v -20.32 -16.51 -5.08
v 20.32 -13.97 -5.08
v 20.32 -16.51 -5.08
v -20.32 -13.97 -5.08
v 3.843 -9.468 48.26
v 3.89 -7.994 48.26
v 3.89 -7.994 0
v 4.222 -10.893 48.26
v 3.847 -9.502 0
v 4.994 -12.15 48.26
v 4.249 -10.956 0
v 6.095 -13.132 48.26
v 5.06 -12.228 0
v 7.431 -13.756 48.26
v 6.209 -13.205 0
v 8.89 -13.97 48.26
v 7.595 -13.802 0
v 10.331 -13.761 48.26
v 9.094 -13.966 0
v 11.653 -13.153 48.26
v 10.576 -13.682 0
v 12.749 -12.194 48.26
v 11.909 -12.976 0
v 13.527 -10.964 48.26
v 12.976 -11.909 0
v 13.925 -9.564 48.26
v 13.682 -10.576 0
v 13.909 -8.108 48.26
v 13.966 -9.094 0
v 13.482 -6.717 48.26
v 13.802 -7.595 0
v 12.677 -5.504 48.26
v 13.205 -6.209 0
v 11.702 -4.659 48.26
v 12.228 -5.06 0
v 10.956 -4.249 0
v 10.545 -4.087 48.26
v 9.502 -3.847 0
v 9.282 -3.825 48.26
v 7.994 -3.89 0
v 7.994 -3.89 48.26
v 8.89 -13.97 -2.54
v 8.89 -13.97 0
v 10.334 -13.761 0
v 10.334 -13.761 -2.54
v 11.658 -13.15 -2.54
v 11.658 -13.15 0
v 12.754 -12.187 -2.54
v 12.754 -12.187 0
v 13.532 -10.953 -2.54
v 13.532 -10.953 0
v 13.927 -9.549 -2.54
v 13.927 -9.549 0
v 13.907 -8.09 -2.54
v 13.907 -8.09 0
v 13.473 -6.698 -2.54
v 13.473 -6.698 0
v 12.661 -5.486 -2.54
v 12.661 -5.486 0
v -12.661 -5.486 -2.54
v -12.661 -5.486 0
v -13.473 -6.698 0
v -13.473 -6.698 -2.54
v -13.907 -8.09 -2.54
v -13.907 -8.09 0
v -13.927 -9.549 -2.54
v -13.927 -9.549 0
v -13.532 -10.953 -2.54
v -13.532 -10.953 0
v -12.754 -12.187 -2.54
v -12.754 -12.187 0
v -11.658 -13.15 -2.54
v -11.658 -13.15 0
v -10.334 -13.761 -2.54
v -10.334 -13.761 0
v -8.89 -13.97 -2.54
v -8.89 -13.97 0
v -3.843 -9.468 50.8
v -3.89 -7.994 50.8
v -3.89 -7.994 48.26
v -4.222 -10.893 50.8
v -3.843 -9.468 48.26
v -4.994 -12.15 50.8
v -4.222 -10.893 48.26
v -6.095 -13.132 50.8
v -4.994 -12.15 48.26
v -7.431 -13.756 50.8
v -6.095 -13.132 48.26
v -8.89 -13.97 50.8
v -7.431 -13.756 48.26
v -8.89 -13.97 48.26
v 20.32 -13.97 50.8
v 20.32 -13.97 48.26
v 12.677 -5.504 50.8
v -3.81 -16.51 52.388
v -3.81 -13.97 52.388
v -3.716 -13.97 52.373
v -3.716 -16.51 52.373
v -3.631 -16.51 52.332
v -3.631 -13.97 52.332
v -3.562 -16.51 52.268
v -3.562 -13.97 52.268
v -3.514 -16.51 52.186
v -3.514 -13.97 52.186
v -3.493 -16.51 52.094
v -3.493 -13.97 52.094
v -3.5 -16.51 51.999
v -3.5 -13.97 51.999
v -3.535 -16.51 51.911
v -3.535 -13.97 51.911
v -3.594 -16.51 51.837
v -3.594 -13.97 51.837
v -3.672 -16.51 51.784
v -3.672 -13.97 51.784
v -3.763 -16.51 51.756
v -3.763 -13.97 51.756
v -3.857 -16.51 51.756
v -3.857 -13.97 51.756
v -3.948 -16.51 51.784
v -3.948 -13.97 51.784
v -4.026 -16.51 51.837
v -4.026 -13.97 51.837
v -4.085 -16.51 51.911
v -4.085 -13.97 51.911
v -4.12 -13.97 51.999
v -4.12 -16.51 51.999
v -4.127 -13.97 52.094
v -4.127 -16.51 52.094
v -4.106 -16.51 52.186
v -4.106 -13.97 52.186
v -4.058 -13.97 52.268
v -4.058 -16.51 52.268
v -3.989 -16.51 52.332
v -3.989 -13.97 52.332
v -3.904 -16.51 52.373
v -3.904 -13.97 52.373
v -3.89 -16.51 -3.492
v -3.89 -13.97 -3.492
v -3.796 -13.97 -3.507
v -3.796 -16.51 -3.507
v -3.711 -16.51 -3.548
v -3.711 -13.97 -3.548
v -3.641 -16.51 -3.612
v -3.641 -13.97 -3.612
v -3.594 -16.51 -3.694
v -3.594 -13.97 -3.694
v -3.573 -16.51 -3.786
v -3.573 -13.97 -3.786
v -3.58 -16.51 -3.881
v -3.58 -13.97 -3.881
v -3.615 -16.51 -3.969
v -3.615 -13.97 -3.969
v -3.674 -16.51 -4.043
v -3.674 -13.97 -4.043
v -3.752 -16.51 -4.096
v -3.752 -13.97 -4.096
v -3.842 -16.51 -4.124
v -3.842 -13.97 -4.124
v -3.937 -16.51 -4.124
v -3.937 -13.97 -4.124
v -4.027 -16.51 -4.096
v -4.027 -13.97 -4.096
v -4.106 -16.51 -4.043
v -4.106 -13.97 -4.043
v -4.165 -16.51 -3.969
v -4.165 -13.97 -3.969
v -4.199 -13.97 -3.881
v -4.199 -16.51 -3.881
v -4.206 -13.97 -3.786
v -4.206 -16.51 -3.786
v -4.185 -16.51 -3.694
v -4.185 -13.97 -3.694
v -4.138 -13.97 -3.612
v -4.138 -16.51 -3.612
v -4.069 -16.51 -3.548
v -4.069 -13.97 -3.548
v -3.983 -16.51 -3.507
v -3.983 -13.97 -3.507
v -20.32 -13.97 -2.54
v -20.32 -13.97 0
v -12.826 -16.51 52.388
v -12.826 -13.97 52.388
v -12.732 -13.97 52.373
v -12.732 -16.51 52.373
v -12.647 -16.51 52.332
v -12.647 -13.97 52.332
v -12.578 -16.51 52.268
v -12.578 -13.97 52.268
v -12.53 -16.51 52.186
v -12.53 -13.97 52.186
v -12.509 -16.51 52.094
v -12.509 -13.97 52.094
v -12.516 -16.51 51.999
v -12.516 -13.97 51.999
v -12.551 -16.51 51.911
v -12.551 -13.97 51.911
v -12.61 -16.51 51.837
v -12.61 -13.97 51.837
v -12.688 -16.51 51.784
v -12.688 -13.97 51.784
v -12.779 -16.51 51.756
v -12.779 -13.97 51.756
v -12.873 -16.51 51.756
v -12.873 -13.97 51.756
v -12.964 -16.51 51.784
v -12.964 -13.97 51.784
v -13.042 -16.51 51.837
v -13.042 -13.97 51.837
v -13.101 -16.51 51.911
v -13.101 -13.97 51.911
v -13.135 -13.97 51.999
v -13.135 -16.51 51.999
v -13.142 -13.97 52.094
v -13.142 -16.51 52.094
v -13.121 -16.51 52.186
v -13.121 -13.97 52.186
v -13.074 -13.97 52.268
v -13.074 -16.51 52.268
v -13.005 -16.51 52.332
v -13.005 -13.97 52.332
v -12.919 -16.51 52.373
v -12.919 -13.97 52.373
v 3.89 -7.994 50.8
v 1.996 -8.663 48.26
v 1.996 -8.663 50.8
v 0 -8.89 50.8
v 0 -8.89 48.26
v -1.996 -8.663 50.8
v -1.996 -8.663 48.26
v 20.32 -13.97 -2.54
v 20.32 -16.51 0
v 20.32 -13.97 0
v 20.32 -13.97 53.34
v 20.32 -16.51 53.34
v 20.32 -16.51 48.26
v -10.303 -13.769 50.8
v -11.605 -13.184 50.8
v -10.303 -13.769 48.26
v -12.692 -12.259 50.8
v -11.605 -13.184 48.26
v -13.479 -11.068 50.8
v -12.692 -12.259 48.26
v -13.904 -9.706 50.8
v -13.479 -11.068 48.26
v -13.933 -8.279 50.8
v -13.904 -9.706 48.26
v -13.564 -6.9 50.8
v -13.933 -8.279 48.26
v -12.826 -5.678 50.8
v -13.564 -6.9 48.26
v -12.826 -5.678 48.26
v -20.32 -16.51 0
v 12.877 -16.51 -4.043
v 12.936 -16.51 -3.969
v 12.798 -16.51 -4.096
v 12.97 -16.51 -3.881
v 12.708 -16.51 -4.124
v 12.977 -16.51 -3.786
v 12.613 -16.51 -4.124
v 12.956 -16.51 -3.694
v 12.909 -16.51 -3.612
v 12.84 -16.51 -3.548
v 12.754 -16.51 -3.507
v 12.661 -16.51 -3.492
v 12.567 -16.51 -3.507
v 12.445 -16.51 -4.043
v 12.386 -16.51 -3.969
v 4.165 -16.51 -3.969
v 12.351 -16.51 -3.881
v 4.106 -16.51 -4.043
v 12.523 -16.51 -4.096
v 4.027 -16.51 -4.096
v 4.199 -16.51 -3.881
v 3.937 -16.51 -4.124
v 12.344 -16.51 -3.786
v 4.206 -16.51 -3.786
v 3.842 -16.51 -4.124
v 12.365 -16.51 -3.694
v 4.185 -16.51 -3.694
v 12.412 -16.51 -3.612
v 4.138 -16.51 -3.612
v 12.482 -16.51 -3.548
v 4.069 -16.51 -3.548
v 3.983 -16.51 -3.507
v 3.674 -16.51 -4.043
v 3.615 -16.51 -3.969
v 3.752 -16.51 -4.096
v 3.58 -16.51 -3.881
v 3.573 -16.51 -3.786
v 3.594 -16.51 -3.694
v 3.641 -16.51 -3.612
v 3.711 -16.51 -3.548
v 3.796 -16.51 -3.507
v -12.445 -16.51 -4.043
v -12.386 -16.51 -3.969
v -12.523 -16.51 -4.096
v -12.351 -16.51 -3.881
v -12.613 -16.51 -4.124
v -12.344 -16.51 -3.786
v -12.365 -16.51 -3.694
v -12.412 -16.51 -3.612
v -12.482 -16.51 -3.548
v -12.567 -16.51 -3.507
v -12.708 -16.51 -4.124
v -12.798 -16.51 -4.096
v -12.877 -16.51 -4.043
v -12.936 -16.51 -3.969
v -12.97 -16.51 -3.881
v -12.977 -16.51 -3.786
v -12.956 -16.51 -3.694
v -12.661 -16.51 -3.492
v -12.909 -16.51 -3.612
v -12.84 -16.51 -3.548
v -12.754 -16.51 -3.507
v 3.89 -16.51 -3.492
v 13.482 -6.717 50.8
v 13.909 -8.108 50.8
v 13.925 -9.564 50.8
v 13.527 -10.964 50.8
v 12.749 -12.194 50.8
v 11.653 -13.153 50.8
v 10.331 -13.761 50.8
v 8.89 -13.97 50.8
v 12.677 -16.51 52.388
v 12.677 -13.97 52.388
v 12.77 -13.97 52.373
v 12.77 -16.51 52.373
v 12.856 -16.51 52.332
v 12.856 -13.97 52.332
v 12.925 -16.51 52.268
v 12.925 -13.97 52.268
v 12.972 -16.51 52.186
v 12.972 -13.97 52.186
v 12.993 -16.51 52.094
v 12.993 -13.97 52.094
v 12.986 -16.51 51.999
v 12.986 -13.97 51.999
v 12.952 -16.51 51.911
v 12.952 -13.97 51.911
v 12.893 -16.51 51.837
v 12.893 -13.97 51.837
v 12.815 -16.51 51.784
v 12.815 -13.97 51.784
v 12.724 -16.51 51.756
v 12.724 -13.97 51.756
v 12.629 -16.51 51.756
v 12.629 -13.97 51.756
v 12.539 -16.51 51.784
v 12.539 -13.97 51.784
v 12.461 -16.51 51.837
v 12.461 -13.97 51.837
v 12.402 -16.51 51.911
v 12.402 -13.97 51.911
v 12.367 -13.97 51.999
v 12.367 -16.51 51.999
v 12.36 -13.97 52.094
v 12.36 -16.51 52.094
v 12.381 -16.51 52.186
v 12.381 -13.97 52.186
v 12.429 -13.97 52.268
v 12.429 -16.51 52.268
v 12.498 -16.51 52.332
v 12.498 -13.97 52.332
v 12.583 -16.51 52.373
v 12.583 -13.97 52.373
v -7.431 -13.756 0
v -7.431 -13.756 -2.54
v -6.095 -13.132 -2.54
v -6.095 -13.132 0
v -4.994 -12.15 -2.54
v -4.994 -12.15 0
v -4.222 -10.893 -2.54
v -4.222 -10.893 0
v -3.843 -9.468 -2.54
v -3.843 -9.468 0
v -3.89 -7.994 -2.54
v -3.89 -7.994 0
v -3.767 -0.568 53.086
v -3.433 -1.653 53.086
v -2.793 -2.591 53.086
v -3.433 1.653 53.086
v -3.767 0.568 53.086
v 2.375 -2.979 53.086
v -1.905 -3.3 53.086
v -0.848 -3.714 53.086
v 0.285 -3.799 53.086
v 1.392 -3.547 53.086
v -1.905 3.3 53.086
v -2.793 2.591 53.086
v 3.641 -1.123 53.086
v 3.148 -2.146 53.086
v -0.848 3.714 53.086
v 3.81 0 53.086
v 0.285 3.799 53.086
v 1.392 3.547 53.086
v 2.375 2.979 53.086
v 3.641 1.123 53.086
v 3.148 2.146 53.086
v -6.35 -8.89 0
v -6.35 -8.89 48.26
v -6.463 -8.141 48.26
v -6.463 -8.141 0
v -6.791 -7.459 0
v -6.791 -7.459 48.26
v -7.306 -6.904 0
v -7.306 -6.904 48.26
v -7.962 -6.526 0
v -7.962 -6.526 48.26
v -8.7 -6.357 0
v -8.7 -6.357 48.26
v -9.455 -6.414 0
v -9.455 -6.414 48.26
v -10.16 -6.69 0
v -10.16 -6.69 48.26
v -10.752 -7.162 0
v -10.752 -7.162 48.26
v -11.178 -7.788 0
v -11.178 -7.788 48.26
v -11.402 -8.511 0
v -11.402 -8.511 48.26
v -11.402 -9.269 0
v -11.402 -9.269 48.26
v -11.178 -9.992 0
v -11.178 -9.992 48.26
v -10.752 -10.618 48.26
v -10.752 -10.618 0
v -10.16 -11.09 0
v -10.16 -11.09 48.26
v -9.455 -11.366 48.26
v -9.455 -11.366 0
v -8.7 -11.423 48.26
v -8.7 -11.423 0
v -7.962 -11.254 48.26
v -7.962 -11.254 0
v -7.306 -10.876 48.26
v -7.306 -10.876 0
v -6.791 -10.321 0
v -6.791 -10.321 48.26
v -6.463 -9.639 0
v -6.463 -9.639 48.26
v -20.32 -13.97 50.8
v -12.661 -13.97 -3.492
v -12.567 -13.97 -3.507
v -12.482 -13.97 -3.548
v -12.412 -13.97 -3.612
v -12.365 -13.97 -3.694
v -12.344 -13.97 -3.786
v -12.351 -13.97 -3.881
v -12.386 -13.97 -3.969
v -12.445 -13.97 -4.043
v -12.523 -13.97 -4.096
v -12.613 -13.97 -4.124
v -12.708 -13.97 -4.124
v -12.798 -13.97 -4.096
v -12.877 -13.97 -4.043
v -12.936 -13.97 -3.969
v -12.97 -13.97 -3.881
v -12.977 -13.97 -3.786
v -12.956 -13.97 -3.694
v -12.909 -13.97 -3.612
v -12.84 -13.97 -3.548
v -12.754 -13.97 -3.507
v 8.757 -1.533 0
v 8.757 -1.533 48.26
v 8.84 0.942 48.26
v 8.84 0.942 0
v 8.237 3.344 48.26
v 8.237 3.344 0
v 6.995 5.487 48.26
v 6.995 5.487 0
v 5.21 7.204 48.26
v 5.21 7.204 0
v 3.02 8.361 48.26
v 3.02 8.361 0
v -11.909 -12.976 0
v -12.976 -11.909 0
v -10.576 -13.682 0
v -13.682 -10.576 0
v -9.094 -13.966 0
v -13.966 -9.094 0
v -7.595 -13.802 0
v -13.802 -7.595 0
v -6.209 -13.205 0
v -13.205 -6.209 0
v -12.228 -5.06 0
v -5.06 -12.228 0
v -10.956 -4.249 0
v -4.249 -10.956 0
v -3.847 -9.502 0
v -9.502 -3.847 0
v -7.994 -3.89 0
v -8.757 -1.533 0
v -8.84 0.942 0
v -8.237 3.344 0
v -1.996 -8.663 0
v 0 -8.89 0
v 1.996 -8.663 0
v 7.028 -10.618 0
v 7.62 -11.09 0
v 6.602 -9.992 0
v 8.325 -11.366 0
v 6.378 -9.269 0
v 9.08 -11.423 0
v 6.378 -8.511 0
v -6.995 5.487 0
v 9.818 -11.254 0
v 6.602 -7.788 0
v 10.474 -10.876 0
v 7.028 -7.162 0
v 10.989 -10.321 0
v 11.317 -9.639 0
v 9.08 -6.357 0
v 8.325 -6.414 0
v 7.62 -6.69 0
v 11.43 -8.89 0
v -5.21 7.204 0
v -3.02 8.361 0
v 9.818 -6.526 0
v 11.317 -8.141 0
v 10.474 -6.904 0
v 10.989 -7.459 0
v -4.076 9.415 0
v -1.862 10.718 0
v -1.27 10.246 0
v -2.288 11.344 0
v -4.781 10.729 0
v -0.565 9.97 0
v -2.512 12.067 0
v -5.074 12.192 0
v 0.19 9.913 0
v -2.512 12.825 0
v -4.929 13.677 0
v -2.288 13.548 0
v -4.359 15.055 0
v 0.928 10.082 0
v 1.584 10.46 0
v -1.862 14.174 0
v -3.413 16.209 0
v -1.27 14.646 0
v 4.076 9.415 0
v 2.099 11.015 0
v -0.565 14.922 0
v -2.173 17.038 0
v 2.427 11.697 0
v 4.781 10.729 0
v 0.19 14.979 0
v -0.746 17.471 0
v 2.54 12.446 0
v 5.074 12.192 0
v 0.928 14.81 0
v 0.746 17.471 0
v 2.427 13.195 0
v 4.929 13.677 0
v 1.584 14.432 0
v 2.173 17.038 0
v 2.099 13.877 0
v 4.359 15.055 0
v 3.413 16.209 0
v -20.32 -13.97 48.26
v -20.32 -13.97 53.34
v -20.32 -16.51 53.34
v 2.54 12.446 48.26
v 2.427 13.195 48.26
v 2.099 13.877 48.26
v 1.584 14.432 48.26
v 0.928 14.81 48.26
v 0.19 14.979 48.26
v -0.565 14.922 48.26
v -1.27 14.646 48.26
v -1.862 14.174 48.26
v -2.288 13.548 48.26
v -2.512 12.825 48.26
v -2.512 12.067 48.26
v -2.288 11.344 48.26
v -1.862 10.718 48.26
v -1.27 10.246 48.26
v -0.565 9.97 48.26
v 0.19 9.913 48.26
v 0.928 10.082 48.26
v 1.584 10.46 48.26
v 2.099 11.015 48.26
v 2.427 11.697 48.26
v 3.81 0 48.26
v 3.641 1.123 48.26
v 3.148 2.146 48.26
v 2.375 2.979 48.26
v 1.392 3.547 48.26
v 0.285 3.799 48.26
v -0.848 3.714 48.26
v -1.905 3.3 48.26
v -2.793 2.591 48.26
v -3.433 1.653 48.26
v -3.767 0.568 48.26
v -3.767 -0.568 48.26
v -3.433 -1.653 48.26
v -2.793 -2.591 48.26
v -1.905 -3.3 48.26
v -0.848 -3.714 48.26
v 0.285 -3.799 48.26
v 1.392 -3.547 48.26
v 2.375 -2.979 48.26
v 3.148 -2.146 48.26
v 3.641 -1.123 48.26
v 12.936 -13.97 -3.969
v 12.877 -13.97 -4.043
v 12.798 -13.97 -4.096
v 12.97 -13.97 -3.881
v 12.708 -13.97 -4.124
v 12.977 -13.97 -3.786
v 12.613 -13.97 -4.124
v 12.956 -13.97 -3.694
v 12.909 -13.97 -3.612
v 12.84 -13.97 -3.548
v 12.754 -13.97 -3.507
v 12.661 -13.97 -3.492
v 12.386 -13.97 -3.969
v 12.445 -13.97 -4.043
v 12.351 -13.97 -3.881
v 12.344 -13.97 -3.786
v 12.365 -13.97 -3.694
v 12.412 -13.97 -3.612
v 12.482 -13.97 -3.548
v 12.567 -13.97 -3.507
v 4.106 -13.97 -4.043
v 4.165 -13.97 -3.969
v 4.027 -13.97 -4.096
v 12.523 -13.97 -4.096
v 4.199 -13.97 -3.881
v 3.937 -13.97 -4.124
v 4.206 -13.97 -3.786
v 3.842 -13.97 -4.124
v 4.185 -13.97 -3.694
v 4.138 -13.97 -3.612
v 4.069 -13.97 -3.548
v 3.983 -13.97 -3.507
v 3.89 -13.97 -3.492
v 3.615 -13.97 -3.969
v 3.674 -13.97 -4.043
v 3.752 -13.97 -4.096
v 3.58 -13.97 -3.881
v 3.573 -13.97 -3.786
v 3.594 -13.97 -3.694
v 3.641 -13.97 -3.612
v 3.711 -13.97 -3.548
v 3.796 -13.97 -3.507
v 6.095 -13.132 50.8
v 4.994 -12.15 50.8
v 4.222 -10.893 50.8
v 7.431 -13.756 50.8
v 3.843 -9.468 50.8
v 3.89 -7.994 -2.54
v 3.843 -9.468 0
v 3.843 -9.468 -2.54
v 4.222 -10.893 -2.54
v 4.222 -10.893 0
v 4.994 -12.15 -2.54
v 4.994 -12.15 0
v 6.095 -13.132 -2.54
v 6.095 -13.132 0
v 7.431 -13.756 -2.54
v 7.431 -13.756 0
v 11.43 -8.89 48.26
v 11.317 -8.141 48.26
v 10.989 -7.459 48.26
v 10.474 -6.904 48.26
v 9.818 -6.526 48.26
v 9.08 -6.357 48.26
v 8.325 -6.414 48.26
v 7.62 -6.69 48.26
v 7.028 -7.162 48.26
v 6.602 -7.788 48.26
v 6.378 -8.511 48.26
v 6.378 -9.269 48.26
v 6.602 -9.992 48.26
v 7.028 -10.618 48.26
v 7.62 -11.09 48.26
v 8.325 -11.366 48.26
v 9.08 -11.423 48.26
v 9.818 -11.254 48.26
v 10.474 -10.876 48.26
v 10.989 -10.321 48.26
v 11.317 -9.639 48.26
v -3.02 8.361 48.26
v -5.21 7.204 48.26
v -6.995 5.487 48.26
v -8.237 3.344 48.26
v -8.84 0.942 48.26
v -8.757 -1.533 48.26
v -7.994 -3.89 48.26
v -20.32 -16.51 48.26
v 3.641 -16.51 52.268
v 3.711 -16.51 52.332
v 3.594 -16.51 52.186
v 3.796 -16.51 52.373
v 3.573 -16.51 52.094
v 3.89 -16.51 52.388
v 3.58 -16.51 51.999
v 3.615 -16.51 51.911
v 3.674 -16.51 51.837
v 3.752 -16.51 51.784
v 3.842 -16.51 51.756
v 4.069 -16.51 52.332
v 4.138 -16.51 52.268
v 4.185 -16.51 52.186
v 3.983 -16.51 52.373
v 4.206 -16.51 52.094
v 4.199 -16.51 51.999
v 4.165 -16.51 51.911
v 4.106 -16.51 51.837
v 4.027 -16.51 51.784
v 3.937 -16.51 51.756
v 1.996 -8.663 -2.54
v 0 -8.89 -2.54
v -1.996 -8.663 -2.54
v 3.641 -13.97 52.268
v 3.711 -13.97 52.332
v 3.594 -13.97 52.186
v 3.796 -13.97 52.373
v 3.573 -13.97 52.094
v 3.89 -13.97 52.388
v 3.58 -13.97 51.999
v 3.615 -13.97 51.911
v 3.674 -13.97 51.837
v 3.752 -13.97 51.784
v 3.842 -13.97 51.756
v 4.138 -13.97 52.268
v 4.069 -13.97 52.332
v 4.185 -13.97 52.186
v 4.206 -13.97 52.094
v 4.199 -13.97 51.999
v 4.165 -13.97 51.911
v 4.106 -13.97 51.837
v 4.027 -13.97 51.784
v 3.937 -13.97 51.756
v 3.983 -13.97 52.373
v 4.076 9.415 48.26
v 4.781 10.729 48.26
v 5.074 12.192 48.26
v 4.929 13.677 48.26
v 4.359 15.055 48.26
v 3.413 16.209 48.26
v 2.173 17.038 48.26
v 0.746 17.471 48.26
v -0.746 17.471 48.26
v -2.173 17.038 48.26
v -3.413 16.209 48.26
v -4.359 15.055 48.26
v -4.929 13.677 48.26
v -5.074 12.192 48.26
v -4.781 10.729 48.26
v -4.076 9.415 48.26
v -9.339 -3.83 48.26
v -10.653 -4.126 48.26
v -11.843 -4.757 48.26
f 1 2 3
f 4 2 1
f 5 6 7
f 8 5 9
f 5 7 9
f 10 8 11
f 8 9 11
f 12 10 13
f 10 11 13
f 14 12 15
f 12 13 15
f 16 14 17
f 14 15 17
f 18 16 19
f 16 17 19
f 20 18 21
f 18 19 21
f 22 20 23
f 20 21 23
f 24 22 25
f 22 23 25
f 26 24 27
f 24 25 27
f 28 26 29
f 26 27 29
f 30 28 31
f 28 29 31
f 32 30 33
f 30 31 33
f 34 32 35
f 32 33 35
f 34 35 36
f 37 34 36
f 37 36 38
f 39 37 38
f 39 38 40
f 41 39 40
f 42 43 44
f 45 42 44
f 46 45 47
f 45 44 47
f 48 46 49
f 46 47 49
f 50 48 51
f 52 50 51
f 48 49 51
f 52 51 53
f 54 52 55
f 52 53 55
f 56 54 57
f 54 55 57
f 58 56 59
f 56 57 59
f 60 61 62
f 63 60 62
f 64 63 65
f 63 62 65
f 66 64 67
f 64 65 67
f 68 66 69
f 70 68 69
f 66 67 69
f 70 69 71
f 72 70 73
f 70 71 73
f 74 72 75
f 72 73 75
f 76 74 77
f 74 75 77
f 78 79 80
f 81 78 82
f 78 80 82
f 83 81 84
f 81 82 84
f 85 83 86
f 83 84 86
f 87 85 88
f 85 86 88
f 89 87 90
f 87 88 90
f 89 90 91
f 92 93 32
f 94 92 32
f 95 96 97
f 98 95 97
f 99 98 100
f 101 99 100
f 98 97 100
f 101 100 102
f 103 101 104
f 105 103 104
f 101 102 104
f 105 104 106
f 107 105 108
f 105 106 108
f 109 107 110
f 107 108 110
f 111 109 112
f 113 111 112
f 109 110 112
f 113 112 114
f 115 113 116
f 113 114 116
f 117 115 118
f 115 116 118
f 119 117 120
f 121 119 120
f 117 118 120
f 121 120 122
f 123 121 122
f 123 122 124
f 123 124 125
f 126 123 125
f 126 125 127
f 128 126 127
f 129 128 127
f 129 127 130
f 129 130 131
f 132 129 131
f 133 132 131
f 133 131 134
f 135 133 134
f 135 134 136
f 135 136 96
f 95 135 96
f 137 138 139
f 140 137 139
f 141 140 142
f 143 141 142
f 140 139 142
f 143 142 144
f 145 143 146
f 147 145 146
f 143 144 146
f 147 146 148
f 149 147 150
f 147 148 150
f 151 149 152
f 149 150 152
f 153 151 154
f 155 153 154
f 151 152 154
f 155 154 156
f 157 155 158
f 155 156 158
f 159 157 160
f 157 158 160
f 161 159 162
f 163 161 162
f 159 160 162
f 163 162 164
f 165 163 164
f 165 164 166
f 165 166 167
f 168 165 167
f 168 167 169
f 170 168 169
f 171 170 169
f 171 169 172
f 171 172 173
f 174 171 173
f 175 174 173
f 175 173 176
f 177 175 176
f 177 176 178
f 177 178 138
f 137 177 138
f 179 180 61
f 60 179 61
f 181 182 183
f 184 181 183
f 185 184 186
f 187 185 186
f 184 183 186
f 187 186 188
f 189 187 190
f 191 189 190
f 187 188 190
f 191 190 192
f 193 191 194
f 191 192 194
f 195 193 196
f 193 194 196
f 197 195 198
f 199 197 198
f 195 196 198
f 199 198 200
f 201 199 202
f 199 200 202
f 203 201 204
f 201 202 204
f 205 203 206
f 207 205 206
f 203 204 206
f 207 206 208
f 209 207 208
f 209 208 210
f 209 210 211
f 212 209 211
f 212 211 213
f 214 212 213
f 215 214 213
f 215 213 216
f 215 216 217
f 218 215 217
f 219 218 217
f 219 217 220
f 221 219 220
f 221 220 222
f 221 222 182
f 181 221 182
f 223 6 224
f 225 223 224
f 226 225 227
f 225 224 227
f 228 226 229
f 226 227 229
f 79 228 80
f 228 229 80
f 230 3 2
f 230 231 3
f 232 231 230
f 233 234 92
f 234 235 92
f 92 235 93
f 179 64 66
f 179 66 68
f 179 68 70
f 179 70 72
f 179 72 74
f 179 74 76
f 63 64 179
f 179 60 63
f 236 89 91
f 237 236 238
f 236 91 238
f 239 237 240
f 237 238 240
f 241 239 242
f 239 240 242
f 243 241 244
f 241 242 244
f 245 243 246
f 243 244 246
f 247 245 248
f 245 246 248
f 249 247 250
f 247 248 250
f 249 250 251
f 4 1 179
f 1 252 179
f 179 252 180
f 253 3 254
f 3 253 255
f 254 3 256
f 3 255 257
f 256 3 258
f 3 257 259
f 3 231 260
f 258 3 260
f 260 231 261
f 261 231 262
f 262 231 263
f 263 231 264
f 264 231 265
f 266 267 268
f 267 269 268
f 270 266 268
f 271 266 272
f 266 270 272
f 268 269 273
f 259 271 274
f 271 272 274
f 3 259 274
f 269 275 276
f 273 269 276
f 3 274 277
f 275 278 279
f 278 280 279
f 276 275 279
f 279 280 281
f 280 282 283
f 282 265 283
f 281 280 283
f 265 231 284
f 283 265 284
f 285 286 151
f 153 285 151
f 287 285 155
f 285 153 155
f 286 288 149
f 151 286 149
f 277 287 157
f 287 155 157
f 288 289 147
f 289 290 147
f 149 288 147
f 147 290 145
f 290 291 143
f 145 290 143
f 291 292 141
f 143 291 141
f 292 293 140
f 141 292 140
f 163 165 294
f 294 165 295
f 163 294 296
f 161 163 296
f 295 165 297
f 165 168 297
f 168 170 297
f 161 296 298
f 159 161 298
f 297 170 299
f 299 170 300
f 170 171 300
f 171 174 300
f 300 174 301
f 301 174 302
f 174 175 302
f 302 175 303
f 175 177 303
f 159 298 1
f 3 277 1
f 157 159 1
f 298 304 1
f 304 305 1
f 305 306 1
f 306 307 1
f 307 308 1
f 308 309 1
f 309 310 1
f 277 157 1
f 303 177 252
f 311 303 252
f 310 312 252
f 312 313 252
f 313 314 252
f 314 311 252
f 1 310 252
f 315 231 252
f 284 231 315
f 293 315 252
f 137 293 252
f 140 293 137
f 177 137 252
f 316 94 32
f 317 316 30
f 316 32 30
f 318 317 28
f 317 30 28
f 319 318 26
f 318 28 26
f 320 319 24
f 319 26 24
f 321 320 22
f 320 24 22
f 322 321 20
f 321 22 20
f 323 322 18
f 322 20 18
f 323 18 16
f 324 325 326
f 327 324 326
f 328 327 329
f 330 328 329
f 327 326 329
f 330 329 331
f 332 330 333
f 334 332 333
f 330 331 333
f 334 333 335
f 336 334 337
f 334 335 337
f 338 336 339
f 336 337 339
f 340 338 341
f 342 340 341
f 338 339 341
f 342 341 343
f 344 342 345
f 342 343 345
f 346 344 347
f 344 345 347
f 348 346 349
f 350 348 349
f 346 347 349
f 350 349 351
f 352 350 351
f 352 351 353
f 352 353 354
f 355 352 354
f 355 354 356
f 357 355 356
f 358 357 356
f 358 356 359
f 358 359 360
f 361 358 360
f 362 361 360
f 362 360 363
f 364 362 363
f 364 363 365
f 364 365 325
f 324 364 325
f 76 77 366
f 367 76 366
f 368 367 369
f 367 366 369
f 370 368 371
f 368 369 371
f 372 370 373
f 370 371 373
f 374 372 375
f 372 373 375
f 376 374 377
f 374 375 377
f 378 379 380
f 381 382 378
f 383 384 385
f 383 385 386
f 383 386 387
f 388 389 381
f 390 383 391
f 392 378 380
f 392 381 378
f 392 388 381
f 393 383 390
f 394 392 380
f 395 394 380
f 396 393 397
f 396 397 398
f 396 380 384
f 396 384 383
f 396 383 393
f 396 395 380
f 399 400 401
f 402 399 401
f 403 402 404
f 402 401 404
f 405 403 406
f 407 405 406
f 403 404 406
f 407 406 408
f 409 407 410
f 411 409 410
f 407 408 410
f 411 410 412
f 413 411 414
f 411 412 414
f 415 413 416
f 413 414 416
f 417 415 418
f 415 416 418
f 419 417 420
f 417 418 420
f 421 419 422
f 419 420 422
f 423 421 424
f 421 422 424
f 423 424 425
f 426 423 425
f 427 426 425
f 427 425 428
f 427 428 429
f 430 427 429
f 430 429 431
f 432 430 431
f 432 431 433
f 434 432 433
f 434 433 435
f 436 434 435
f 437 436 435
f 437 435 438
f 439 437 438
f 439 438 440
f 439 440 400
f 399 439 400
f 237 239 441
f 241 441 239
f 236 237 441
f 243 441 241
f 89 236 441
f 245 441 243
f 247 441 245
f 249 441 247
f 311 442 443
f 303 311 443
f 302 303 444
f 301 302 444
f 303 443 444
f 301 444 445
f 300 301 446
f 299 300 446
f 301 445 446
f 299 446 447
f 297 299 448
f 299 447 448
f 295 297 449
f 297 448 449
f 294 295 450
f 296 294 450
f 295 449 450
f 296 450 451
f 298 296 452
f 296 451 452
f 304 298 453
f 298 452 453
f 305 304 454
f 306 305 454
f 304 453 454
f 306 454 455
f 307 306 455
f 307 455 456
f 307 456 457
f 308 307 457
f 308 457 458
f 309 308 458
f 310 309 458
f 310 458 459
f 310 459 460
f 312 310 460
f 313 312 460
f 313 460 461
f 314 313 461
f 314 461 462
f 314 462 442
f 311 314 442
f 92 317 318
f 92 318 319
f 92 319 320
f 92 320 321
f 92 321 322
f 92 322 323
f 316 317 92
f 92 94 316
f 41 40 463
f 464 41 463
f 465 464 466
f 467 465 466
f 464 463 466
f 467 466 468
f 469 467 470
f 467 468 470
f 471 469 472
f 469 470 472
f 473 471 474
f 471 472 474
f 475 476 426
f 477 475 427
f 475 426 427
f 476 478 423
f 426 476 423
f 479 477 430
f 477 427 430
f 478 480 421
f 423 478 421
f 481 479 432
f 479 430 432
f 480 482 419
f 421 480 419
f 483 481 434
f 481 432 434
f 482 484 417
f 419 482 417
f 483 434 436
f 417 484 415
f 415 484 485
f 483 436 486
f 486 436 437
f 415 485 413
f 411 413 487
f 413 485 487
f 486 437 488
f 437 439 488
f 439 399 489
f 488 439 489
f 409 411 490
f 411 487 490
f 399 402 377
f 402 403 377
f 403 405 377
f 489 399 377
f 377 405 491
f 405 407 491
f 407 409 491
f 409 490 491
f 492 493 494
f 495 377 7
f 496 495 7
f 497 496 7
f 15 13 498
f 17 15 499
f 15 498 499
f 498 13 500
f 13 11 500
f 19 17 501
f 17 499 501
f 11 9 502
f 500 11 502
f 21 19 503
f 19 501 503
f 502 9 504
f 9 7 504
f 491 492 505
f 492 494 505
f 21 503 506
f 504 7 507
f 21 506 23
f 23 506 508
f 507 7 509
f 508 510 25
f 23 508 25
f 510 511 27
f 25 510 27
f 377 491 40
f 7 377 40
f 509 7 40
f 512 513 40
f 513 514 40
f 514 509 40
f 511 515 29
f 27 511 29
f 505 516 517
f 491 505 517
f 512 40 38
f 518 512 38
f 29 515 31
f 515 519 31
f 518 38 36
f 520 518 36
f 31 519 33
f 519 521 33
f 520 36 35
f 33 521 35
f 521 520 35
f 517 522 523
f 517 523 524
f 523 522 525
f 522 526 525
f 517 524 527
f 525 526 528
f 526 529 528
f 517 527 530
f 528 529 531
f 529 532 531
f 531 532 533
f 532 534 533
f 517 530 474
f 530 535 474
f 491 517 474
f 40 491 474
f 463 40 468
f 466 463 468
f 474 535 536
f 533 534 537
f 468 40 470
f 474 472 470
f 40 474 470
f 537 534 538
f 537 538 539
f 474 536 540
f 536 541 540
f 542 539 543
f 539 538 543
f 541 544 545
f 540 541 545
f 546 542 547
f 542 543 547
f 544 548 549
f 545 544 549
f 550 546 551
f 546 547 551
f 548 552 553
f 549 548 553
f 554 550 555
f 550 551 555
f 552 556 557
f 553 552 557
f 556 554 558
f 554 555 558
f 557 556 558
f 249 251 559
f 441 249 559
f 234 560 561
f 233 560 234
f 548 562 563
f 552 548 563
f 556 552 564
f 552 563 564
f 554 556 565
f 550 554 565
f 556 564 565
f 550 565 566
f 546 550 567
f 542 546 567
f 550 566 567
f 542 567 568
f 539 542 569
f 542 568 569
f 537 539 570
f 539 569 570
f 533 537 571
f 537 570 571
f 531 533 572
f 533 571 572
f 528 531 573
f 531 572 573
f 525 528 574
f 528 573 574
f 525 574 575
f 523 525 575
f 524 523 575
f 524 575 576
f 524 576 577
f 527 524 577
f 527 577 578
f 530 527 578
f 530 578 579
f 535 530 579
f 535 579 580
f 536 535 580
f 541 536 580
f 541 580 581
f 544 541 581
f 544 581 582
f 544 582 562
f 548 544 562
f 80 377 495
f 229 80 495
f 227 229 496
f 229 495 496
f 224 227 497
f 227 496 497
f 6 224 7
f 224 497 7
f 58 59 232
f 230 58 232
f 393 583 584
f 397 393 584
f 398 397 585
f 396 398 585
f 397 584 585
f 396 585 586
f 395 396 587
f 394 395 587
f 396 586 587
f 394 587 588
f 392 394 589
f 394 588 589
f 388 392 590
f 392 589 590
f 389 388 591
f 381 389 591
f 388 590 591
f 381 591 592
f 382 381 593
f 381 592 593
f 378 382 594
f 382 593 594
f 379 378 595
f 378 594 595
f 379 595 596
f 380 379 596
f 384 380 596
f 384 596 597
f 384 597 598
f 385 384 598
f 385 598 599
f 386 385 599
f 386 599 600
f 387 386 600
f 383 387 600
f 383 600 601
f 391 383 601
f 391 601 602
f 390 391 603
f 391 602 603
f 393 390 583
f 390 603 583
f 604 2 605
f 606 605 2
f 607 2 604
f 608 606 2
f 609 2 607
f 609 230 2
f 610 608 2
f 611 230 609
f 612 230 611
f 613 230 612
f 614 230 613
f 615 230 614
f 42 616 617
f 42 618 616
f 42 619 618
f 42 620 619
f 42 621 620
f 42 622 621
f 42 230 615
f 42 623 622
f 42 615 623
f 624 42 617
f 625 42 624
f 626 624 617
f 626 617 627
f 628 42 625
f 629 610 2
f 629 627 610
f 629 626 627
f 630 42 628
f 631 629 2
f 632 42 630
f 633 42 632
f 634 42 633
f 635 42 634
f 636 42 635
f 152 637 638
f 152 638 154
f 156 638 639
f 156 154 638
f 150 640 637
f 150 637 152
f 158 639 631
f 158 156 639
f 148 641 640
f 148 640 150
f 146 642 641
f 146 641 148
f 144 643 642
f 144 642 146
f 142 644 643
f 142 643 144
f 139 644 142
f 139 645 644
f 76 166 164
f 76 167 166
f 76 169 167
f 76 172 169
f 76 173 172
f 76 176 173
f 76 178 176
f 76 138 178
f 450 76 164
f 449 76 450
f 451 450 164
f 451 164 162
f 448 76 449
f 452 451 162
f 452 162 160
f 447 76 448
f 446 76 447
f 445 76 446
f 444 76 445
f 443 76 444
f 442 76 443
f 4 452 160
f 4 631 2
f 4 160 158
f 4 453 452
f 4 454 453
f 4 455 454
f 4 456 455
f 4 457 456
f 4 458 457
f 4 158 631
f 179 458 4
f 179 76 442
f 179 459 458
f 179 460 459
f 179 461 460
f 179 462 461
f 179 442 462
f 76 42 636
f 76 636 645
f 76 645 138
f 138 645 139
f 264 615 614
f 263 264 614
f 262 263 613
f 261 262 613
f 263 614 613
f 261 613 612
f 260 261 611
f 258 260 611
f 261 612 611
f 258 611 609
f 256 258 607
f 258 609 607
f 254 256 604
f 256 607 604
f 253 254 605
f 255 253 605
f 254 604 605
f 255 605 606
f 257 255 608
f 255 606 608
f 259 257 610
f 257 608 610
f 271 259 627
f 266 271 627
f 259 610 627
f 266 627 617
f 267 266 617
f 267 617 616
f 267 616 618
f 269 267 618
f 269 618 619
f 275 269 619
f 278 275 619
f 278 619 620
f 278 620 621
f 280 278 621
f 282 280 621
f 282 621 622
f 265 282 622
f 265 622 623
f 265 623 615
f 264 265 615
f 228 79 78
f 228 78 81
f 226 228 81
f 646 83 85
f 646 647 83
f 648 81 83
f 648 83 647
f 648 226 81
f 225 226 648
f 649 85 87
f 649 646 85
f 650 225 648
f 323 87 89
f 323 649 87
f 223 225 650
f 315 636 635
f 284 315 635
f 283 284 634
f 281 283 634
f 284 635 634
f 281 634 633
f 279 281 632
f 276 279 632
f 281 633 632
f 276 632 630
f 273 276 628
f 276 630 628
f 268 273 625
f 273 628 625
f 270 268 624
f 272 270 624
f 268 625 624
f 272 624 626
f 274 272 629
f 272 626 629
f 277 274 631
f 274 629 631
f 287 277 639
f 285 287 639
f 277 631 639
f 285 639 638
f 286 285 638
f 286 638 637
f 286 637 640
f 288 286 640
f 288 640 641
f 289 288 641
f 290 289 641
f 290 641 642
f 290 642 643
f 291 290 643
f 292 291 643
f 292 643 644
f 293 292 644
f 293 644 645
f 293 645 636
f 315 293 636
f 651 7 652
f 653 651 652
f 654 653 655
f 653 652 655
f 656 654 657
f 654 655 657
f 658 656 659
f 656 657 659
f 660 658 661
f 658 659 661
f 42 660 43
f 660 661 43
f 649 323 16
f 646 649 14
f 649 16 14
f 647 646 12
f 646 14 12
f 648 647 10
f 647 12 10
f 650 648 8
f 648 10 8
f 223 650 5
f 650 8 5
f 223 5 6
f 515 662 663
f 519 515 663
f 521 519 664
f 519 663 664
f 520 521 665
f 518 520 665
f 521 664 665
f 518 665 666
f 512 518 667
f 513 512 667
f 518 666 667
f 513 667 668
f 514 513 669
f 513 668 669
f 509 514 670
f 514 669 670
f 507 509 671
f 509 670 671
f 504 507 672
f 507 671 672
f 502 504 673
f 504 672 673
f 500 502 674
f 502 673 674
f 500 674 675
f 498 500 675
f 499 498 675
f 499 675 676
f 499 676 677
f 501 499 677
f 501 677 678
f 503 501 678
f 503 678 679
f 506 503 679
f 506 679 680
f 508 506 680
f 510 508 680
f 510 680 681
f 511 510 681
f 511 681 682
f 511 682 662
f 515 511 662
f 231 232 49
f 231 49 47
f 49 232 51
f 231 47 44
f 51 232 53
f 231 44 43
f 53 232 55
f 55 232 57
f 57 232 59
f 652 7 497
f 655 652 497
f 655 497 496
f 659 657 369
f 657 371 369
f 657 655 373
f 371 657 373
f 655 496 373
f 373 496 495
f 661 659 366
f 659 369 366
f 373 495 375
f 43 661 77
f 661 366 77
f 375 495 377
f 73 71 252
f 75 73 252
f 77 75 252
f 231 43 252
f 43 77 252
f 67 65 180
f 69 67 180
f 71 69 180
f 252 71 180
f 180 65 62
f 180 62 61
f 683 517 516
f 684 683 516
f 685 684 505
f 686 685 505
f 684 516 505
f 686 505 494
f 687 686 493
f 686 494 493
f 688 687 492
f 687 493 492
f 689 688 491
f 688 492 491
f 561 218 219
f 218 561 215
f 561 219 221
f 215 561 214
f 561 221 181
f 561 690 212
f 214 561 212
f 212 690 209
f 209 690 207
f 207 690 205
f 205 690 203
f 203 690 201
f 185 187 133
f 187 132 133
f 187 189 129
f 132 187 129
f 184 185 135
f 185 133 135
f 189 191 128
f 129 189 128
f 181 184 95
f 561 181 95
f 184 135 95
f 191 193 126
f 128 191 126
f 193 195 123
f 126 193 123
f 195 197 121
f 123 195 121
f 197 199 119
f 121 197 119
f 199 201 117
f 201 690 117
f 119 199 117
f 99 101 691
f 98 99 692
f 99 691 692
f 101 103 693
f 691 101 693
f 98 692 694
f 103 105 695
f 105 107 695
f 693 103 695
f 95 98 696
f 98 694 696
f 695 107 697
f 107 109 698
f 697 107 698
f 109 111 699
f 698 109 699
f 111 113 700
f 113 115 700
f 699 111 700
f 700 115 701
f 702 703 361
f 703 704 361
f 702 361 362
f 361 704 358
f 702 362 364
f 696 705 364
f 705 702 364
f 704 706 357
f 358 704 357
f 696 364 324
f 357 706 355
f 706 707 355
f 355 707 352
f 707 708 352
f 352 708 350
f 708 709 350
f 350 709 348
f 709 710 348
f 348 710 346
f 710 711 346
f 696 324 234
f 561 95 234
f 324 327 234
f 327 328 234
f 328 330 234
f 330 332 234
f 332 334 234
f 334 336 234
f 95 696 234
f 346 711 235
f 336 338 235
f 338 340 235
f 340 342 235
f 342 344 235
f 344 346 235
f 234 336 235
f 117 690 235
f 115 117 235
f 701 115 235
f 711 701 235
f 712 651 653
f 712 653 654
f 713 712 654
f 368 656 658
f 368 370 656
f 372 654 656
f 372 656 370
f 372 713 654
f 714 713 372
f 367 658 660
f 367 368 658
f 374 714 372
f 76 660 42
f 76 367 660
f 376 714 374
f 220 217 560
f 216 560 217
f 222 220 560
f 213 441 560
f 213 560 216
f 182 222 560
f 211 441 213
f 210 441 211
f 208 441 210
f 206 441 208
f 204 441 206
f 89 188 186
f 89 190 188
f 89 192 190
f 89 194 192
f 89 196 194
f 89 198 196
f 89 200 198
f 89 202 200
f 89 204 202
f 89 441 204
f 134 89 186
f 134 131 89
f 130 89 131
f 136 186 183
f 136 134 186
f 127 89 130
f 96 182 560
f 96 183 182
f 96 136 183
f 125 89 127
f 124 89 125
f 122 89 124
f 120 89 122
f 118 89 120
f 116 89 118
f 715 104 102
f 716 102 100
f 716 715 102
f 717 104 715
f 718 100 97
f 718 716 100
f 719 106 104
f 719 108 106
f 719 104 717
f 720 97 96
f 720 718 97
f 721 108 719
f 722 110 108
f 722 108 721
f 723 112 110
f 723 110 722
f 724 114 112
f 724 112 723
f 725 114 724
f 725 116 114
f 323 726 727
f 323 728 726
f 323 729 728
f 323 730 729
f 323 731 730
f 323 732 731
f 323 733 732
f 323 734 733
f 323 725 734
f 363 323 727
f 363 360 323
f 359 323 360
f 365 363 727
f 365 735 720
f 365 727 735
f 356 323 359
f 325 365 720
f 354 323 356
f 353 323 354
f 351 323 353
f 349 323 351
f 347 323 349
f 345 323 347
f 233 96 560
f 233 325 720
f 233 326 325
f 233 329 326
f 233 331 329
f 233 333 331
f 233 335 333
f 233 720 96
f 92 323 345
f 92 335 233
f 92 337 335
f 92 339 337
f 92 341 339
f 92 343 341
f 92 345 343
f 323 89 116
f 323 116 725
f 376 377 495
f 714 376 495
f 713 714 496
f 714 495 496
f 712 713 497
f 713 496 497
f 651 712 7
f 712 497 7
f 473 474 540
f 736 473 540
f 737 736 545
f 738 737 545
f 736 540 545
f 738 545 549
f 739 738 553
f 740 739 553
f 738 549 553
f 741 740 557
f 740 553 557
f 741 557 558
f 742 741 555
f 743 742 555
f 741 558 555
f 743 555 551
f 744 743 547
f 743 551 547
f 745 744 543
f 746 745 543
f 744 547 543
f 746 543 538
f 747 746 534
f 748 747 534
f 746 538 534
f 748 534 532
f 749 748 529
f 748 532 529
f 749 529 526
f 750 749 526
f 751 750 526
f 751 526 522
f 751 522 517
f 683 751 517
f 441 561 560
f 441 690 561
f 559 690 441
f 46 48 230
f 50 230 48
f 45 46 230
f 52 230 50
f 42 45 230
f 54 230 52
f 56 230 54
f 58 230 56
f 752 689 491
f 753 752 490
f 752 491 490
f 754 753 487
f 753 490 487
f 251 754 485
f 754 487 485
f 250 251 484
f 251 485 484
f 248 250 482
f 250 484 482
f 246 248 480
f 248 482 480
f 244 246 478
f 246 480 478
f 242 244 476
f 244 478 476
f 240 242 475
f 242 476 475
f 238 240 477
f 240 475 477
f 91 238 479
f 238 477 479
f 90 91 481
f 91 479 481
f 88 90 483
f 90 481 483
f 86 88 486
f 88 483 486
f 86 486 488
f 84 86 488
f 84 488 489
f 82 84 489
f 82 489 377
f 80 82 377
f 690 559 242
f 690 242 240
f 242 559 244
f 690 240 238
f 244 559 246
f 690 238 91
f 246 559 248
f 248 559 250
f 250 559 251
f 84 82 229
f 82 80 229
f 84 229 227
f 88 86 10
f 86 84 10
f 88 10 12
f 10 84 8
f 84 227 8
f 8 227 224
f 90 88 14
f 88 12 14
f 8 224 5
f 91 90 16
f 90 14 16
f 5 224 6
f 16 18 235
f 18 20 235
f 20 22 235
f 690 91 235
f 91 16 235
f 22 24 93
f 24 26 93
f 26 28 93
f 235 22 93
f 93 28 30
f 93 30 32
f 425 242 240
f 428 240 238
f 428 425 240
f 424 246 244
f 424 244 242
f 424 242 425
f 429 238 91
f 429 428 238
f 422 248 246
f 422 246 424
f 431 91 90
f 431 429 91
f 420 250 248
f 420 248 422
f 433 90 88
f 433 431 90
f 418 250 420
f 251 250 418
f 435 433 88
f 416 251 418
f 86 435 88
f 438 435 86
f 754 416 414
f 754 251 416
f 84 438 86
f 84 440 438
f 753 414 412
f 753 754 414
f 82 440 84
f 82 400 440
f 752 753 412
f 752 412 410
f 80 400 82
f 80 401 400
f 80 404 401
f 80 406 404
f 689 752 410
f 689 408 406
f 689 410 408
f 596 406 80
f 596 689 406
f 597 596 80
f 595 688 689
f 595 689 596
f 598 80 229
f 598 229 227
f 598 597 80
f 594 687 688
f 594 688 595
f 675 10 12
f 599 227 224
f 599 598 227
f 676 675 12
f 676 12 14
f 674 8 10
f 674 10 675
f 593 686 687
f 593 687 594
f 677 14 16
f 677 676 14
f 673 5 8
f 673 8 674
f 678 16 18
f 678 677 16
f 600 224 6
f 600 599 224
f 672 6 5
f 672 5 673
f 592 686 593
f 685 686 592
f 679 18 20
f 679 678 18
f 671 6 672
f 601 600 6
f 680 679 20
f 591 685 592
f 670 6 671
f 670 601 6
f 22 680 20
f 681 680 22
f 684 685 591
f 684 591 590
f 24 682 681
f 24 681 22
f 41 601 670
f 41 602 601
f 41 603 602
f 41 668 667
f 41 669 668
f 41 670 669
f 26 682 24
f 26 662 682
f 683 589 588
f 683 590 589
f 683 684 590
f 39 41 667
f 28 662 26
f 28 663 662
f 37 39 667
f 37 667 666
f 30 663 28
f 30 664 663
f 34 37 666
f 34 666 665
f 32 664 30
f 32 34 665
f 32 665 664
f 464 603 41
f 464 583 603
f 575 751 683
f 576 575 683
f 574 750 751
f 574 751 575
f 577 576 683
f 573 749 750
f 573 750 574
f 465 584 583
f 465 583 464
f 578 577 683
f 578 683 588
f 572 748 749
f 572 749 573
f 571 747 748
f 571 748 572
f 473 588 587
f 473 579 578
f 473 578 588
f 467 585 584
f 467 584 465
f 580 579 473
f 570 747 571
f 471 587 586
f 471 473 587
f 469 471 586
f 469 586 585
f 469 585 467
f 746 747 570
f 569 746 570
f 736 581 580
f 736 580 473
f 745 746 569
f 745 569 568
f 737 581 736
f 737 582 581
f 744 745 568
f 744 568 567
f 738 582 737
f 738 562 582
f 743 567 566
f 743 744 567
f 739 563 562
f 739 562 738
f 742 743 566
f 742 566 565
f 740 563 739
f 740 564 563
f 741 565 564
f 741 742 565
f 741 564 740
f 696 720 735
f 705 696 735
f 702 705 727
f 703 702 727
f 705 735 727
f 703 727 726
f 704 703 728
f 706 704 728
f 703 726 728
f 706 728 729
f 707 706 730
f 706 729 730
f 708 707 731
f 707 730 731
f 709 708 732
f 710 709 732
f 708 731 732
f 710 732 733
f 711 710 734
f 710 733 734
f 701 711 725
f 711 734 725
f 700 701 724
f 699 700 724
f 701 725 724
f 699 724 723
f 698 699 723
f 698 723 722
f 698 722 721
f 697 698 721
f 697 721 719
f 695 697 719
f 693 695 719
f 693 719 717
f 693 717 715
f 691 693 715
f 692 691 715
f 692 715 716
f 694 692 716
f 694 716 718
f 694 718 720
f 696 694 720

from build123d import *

# Parameters (mm, degrees)
BOSS_EXTRUDE1_DEPTH   = 48.26
SKETCH2_R             = 2.54
CUT_EXTRUDE1_DEPTH    = 52.07
BOSS_EXTRUDE2_DEPTH   = 2.54
BOSS_EXTRUDE5_DEPTH   = 2.54
BOSS_EXTRUDE5_2_DEPTH = 2.54
BOSS_EXTRUDE5_3_DEPTH = 2.54
SKETCH6_W             = 40.64
SKETCH6_H             = 2.54
BOSS_EXTRUDE6_DEPTH   = 2.54
SKETCH7_W             = 40.64
SKETCH7_H             = 2.54
BOSS_EXTRUDE7_DEPTH   = 2.54
SKETCH8_W             = 40.64
SKETCH8_H             = 2.54
BOSS_EXTRUDE8_DEPTH   = 2.54
SKETCH9_W             = 40.64
SKETCH9_H             = 2.54
BOSS_EXTRUDE9_DEPTH   = 2.54
SKETCH10_R            = 0.3175
CUT_EXTRUDE2_DEPTH    = 7.366
SKETCH11_R            = 0.3175
CUT_EXTRUDE3_DEPTH    = 7.366
SKETCH12_R            = 3.81
BOSS_EXTRUDE10_DEPTH  = 4.826


# Read off the part's stored shape, not the designer's step: Boss-Extrude2
with BuildPart() as part:
    # Sketch1 → Boss-Extrude1 (new body)
    with BuildSketch(Plane.XY):
        with BuildLine():
            ThreePointArc((-3.020156036, 8.361265306), (-8.237032921, 3.344157391), (-7.993914493, -3.889656935))
            ThreePointArc((-7.993914493, -3.889656935), (-12.482102448, -12.482102448), (-3.889656935, -7.993914493))
            ThreePointArc((-3.889656935, -7.993914493), (0, -8.89), (3.889656935, -7.993914493))
            ThreePointArc((3.889656935, -7.993914493), (12.482102448, -12.482102448), (7.993914493, -3.889656935))
            ThreePointArc((7.993914493, -3.889656935), (8.237032921, 3.344157391), (3.020156036, 8.361265306))
            ThreePointArc((3.020156036, 8.361265306), (0, 17.526), (-3.020156036, 8.361265306))
        make_face()
    extrude(amount=BOSS_EXTRUDE1_DEPTH)

    # Sketch2 → Cut-Extrude1 (cut)
    with BuildSketch(Plane.XY.offset(48.26)):
        with Locations((0, 12.446)):
            Circle(SKETCH2_R)
        with Locations((-8.89, -8.89)):
            Circle(SKETCH2_R)
        with Locations((8.89, -8.89)):
            Circle(SKETCH2_R)
    extrude(amount=-CUT_EXTRUDE1_DEPTH, mode=Mode.SUBTRACT)



with BuildPart() as body_2:
    # Boss-Extrude2 outline → Boss-Extrude2 (new body)
    with BuildSketch(Plane.XY.offset(48.26)):
        with BuildLine():
            ThreePointArc((-8.89, -13.97), (-13.479227022, -11.068392835), (-12.825881599, -5.678265883))
            Line((-12.825881599, -5.678265883), (-20.32, -13.97))
            Line((-20.32, -13.97), (-8.89, -13.97))
        make_face()
        with BuildLine():
            ThreePointArc((12.676802642, -5.503774115), (13.527263606, -10.964171221), (8.89, -13.97))
            Line((8.89, -13.97), (20.32, -13.97))
            Line((20.32, -13.97), (12.676802642, -5.503774115))
        make_face()
        with BuildLine():
            ThreePointArc((-3.889656935, -7.993914493), (-4.99394338, -12.149929879), (-8.89, -13.97))
            Line((-8.89, -13.97), (8.89, -13.97))
            ThreePointArc((8.89, -13.97), (4.99394338, -12.149929879), (3.889656935, -7.993914493))
            ThreePointArc((3.889656935, -7.993914493), (0, -8.89), (-3.889656935, -7.993914493))
        make_face()
    extrude(amount=BOSS_EXTRUDE2_DEPTH)


with BuildPart() as body_3:
    # Sketch5 → Boss-Extrude5 (new body)
    with BuildSketch(Plane(origin=(0, 0, 0), x_dir=(-1, 0, 0), z_dir=(0, 0, -1))):
        with BuildLine():
            Line((-12.660721649, -5.485876288), (-20.32, -13.97))
            Line((-20.32, -13.97), (-8.89, -13.97))
            ThreePointArc((-8.89, -13.97), (-13.532162667, -10.953183407), (-12.660721649, -5.485876288))
        make_face()
    extrude(amount=BOSS_EXTRUDE5_DEPTH)



with BuildPart() as body_4:
    # Sketch5 → Boss-Extrude5 2 (new body)
    with BuildSketch(Plane(origin=(0, 0, 0), x_dir=(-1, 0, 0), z_dir=(0, 0, -1))):
        with BuildLine():
            ThreePointArc((-3.889656935, -7.993914493), (-4.99394338, -12.149929879), (-8.89, -13.97))
            Line((-8.89, -13.97), (8.89, -13.97))
            ThreePointArc((8.89, -13.97), (4.99394338, -12.149929879), (3.889656935, -7.993914493))
            ThreePointArc((3.889656935, -7.993914493), (0, -8.89), (-3.889656935, -7.993914493))
        make_face()
    extrude(amount=BOSS_EXTRUDE5_2_DEPTH)


with BuildPart() as body_5:
    # Sketch5 → Boss-Extrude5 3 (new body)
    with BuildSketch(Plane(origin=(0, 0, 0), x_dir=(-1, 0, 0), z_dir=(0, 0, -1))):
        with BuildLine():
            ThreePointArc((12.660721649, -5.485876288), (13.532162667, -10.953183407), (8.89, -13.97))
            Line((8.89, -13.97), (20.32, -13.97))
            Line((20.32, -13.97), (12.660721649, -5.485876288))
        make_face()
    extrude(amount=BOSS_EXTRUDE5_3_DEPTH)


with BuildPart() as part_1:
    add(part.part)

    add(body_2.part)  # Boss-Extrude6 merges body 2
    # Sketch6 → Boss-Extrude6 (add)
    with BuildSketch(Plane.XY.offset(50.8)):
        with Locations((0, -15.24)):
            Rectangle(SKETCH6_W, SKETCH6_H)
    extrude(amount=-BOSS_EXTRUDE6_DEPTH)

    # Sketch7 → Boss-Extrude7 (add)
    with BuildSketch(Plane.XY.offset(50.8)):
        with Locations((0, -15.24)):
            Rectangle(SKETCH7_W, SKETCH7_H)
    extrude(amount=BOSS_EXTRUDE7_DEPTH)

    # Sketch11 → Cut-Extrude3 (cut)
    with BuildSketch(Plane(origin=(0, -13.97, 0), x_dir=(1, 0, 0), z_dir=(0, 1, 0))):
        with Locations(Location((-12.825881599, -52.07, 0), (0, 0, 270))):
            Circle(SKETCH11_R)
        with Locations(Location((-3.81, -52.07, 0), (0, 0, 270))):
            Circle(SKETCH11_R)
        with Locations(Location((3.889656935, -52.07, 0), (0, 0, 270))):
            Circle(SKETCH11_R)
        with Locations(Location((12.676802642, -52.07, 0), (0, 0, 270))):
            Circle(SKETCH11_R)
    extrude(amount=-CUT_EXTRUDE3_DEPTH, mode=Mode.SUBTRACT)

    # Sketch12 → Boss-Extrude10 (add)
    with BuildSketch(Plane.XY.offset(48.26)):
        Circle(SKETCH12_R)
    extrude(amount=BOSS_EXTRUDE10_DEPTH)


with BuildPart() as body_3_1:
    add(body_3.part)

    add(body_4.part)  # Boss-Extrude8 merges body 4

    add(body_5.part)  # Boss-Extrude8 merges body 5
    # Sketch8 → Boss-Extrude8 (add)
    with BuildSketch(Plane(origin=(0, 0, -2.54), x_dir=(-1, 0, 0), z_dir=(0, 0, -1))):
        with Locations((0, -15.24)):
            Rectangle(SKETCH8_W, SKETCH8_H)
    extrude(amount=-BOSS_EXTRUDE8_DEPTH)

    # Sketch9 → Boss-Extrude9 (add)
    with BuildSketch(Plane(origin=(0, 0, -2.54), x_dir=(-1, 0, 0), z_dir=(0, 0, -1))):
        with Locations((0, -15.24)):
            Rectangle(SKETCH9_W, SKETCH9_H)
    extrude(amount=BOSS_EXTRUDE9_DEPTH)

    # Sketch10 → Cut-Extrude2 (cut)
    with BuildSketch(Plane(origin=(0, -13.97, 0), x_dir=(1, 0, 0), z_dir=(0, 1, 0))):
        with Locations(Location((-12.660721649, 3.81, 0), (0, 0, 270))):
            Circle(SKETCH10_R)
        with Locations(Location((-3.889656935, 3.81, 0), (0, 0, 270))):
            Circle(SKETCH10_R)
        with Locations(Location((3.889656935, 3.81, 0), (0, 0, 270))):
            Circle(SKETCH10_R)
        with Locations(Location((12.660721649, 3.81, 0), (0, 0, 270))):
            Circle(SKETCH10_R)
    extrude(amount=-CUT_EXTRUDE2_DEPTH, mode=Mode.SUBTRACT)


solid = Compound([part_1.part, body_3_1.part])
